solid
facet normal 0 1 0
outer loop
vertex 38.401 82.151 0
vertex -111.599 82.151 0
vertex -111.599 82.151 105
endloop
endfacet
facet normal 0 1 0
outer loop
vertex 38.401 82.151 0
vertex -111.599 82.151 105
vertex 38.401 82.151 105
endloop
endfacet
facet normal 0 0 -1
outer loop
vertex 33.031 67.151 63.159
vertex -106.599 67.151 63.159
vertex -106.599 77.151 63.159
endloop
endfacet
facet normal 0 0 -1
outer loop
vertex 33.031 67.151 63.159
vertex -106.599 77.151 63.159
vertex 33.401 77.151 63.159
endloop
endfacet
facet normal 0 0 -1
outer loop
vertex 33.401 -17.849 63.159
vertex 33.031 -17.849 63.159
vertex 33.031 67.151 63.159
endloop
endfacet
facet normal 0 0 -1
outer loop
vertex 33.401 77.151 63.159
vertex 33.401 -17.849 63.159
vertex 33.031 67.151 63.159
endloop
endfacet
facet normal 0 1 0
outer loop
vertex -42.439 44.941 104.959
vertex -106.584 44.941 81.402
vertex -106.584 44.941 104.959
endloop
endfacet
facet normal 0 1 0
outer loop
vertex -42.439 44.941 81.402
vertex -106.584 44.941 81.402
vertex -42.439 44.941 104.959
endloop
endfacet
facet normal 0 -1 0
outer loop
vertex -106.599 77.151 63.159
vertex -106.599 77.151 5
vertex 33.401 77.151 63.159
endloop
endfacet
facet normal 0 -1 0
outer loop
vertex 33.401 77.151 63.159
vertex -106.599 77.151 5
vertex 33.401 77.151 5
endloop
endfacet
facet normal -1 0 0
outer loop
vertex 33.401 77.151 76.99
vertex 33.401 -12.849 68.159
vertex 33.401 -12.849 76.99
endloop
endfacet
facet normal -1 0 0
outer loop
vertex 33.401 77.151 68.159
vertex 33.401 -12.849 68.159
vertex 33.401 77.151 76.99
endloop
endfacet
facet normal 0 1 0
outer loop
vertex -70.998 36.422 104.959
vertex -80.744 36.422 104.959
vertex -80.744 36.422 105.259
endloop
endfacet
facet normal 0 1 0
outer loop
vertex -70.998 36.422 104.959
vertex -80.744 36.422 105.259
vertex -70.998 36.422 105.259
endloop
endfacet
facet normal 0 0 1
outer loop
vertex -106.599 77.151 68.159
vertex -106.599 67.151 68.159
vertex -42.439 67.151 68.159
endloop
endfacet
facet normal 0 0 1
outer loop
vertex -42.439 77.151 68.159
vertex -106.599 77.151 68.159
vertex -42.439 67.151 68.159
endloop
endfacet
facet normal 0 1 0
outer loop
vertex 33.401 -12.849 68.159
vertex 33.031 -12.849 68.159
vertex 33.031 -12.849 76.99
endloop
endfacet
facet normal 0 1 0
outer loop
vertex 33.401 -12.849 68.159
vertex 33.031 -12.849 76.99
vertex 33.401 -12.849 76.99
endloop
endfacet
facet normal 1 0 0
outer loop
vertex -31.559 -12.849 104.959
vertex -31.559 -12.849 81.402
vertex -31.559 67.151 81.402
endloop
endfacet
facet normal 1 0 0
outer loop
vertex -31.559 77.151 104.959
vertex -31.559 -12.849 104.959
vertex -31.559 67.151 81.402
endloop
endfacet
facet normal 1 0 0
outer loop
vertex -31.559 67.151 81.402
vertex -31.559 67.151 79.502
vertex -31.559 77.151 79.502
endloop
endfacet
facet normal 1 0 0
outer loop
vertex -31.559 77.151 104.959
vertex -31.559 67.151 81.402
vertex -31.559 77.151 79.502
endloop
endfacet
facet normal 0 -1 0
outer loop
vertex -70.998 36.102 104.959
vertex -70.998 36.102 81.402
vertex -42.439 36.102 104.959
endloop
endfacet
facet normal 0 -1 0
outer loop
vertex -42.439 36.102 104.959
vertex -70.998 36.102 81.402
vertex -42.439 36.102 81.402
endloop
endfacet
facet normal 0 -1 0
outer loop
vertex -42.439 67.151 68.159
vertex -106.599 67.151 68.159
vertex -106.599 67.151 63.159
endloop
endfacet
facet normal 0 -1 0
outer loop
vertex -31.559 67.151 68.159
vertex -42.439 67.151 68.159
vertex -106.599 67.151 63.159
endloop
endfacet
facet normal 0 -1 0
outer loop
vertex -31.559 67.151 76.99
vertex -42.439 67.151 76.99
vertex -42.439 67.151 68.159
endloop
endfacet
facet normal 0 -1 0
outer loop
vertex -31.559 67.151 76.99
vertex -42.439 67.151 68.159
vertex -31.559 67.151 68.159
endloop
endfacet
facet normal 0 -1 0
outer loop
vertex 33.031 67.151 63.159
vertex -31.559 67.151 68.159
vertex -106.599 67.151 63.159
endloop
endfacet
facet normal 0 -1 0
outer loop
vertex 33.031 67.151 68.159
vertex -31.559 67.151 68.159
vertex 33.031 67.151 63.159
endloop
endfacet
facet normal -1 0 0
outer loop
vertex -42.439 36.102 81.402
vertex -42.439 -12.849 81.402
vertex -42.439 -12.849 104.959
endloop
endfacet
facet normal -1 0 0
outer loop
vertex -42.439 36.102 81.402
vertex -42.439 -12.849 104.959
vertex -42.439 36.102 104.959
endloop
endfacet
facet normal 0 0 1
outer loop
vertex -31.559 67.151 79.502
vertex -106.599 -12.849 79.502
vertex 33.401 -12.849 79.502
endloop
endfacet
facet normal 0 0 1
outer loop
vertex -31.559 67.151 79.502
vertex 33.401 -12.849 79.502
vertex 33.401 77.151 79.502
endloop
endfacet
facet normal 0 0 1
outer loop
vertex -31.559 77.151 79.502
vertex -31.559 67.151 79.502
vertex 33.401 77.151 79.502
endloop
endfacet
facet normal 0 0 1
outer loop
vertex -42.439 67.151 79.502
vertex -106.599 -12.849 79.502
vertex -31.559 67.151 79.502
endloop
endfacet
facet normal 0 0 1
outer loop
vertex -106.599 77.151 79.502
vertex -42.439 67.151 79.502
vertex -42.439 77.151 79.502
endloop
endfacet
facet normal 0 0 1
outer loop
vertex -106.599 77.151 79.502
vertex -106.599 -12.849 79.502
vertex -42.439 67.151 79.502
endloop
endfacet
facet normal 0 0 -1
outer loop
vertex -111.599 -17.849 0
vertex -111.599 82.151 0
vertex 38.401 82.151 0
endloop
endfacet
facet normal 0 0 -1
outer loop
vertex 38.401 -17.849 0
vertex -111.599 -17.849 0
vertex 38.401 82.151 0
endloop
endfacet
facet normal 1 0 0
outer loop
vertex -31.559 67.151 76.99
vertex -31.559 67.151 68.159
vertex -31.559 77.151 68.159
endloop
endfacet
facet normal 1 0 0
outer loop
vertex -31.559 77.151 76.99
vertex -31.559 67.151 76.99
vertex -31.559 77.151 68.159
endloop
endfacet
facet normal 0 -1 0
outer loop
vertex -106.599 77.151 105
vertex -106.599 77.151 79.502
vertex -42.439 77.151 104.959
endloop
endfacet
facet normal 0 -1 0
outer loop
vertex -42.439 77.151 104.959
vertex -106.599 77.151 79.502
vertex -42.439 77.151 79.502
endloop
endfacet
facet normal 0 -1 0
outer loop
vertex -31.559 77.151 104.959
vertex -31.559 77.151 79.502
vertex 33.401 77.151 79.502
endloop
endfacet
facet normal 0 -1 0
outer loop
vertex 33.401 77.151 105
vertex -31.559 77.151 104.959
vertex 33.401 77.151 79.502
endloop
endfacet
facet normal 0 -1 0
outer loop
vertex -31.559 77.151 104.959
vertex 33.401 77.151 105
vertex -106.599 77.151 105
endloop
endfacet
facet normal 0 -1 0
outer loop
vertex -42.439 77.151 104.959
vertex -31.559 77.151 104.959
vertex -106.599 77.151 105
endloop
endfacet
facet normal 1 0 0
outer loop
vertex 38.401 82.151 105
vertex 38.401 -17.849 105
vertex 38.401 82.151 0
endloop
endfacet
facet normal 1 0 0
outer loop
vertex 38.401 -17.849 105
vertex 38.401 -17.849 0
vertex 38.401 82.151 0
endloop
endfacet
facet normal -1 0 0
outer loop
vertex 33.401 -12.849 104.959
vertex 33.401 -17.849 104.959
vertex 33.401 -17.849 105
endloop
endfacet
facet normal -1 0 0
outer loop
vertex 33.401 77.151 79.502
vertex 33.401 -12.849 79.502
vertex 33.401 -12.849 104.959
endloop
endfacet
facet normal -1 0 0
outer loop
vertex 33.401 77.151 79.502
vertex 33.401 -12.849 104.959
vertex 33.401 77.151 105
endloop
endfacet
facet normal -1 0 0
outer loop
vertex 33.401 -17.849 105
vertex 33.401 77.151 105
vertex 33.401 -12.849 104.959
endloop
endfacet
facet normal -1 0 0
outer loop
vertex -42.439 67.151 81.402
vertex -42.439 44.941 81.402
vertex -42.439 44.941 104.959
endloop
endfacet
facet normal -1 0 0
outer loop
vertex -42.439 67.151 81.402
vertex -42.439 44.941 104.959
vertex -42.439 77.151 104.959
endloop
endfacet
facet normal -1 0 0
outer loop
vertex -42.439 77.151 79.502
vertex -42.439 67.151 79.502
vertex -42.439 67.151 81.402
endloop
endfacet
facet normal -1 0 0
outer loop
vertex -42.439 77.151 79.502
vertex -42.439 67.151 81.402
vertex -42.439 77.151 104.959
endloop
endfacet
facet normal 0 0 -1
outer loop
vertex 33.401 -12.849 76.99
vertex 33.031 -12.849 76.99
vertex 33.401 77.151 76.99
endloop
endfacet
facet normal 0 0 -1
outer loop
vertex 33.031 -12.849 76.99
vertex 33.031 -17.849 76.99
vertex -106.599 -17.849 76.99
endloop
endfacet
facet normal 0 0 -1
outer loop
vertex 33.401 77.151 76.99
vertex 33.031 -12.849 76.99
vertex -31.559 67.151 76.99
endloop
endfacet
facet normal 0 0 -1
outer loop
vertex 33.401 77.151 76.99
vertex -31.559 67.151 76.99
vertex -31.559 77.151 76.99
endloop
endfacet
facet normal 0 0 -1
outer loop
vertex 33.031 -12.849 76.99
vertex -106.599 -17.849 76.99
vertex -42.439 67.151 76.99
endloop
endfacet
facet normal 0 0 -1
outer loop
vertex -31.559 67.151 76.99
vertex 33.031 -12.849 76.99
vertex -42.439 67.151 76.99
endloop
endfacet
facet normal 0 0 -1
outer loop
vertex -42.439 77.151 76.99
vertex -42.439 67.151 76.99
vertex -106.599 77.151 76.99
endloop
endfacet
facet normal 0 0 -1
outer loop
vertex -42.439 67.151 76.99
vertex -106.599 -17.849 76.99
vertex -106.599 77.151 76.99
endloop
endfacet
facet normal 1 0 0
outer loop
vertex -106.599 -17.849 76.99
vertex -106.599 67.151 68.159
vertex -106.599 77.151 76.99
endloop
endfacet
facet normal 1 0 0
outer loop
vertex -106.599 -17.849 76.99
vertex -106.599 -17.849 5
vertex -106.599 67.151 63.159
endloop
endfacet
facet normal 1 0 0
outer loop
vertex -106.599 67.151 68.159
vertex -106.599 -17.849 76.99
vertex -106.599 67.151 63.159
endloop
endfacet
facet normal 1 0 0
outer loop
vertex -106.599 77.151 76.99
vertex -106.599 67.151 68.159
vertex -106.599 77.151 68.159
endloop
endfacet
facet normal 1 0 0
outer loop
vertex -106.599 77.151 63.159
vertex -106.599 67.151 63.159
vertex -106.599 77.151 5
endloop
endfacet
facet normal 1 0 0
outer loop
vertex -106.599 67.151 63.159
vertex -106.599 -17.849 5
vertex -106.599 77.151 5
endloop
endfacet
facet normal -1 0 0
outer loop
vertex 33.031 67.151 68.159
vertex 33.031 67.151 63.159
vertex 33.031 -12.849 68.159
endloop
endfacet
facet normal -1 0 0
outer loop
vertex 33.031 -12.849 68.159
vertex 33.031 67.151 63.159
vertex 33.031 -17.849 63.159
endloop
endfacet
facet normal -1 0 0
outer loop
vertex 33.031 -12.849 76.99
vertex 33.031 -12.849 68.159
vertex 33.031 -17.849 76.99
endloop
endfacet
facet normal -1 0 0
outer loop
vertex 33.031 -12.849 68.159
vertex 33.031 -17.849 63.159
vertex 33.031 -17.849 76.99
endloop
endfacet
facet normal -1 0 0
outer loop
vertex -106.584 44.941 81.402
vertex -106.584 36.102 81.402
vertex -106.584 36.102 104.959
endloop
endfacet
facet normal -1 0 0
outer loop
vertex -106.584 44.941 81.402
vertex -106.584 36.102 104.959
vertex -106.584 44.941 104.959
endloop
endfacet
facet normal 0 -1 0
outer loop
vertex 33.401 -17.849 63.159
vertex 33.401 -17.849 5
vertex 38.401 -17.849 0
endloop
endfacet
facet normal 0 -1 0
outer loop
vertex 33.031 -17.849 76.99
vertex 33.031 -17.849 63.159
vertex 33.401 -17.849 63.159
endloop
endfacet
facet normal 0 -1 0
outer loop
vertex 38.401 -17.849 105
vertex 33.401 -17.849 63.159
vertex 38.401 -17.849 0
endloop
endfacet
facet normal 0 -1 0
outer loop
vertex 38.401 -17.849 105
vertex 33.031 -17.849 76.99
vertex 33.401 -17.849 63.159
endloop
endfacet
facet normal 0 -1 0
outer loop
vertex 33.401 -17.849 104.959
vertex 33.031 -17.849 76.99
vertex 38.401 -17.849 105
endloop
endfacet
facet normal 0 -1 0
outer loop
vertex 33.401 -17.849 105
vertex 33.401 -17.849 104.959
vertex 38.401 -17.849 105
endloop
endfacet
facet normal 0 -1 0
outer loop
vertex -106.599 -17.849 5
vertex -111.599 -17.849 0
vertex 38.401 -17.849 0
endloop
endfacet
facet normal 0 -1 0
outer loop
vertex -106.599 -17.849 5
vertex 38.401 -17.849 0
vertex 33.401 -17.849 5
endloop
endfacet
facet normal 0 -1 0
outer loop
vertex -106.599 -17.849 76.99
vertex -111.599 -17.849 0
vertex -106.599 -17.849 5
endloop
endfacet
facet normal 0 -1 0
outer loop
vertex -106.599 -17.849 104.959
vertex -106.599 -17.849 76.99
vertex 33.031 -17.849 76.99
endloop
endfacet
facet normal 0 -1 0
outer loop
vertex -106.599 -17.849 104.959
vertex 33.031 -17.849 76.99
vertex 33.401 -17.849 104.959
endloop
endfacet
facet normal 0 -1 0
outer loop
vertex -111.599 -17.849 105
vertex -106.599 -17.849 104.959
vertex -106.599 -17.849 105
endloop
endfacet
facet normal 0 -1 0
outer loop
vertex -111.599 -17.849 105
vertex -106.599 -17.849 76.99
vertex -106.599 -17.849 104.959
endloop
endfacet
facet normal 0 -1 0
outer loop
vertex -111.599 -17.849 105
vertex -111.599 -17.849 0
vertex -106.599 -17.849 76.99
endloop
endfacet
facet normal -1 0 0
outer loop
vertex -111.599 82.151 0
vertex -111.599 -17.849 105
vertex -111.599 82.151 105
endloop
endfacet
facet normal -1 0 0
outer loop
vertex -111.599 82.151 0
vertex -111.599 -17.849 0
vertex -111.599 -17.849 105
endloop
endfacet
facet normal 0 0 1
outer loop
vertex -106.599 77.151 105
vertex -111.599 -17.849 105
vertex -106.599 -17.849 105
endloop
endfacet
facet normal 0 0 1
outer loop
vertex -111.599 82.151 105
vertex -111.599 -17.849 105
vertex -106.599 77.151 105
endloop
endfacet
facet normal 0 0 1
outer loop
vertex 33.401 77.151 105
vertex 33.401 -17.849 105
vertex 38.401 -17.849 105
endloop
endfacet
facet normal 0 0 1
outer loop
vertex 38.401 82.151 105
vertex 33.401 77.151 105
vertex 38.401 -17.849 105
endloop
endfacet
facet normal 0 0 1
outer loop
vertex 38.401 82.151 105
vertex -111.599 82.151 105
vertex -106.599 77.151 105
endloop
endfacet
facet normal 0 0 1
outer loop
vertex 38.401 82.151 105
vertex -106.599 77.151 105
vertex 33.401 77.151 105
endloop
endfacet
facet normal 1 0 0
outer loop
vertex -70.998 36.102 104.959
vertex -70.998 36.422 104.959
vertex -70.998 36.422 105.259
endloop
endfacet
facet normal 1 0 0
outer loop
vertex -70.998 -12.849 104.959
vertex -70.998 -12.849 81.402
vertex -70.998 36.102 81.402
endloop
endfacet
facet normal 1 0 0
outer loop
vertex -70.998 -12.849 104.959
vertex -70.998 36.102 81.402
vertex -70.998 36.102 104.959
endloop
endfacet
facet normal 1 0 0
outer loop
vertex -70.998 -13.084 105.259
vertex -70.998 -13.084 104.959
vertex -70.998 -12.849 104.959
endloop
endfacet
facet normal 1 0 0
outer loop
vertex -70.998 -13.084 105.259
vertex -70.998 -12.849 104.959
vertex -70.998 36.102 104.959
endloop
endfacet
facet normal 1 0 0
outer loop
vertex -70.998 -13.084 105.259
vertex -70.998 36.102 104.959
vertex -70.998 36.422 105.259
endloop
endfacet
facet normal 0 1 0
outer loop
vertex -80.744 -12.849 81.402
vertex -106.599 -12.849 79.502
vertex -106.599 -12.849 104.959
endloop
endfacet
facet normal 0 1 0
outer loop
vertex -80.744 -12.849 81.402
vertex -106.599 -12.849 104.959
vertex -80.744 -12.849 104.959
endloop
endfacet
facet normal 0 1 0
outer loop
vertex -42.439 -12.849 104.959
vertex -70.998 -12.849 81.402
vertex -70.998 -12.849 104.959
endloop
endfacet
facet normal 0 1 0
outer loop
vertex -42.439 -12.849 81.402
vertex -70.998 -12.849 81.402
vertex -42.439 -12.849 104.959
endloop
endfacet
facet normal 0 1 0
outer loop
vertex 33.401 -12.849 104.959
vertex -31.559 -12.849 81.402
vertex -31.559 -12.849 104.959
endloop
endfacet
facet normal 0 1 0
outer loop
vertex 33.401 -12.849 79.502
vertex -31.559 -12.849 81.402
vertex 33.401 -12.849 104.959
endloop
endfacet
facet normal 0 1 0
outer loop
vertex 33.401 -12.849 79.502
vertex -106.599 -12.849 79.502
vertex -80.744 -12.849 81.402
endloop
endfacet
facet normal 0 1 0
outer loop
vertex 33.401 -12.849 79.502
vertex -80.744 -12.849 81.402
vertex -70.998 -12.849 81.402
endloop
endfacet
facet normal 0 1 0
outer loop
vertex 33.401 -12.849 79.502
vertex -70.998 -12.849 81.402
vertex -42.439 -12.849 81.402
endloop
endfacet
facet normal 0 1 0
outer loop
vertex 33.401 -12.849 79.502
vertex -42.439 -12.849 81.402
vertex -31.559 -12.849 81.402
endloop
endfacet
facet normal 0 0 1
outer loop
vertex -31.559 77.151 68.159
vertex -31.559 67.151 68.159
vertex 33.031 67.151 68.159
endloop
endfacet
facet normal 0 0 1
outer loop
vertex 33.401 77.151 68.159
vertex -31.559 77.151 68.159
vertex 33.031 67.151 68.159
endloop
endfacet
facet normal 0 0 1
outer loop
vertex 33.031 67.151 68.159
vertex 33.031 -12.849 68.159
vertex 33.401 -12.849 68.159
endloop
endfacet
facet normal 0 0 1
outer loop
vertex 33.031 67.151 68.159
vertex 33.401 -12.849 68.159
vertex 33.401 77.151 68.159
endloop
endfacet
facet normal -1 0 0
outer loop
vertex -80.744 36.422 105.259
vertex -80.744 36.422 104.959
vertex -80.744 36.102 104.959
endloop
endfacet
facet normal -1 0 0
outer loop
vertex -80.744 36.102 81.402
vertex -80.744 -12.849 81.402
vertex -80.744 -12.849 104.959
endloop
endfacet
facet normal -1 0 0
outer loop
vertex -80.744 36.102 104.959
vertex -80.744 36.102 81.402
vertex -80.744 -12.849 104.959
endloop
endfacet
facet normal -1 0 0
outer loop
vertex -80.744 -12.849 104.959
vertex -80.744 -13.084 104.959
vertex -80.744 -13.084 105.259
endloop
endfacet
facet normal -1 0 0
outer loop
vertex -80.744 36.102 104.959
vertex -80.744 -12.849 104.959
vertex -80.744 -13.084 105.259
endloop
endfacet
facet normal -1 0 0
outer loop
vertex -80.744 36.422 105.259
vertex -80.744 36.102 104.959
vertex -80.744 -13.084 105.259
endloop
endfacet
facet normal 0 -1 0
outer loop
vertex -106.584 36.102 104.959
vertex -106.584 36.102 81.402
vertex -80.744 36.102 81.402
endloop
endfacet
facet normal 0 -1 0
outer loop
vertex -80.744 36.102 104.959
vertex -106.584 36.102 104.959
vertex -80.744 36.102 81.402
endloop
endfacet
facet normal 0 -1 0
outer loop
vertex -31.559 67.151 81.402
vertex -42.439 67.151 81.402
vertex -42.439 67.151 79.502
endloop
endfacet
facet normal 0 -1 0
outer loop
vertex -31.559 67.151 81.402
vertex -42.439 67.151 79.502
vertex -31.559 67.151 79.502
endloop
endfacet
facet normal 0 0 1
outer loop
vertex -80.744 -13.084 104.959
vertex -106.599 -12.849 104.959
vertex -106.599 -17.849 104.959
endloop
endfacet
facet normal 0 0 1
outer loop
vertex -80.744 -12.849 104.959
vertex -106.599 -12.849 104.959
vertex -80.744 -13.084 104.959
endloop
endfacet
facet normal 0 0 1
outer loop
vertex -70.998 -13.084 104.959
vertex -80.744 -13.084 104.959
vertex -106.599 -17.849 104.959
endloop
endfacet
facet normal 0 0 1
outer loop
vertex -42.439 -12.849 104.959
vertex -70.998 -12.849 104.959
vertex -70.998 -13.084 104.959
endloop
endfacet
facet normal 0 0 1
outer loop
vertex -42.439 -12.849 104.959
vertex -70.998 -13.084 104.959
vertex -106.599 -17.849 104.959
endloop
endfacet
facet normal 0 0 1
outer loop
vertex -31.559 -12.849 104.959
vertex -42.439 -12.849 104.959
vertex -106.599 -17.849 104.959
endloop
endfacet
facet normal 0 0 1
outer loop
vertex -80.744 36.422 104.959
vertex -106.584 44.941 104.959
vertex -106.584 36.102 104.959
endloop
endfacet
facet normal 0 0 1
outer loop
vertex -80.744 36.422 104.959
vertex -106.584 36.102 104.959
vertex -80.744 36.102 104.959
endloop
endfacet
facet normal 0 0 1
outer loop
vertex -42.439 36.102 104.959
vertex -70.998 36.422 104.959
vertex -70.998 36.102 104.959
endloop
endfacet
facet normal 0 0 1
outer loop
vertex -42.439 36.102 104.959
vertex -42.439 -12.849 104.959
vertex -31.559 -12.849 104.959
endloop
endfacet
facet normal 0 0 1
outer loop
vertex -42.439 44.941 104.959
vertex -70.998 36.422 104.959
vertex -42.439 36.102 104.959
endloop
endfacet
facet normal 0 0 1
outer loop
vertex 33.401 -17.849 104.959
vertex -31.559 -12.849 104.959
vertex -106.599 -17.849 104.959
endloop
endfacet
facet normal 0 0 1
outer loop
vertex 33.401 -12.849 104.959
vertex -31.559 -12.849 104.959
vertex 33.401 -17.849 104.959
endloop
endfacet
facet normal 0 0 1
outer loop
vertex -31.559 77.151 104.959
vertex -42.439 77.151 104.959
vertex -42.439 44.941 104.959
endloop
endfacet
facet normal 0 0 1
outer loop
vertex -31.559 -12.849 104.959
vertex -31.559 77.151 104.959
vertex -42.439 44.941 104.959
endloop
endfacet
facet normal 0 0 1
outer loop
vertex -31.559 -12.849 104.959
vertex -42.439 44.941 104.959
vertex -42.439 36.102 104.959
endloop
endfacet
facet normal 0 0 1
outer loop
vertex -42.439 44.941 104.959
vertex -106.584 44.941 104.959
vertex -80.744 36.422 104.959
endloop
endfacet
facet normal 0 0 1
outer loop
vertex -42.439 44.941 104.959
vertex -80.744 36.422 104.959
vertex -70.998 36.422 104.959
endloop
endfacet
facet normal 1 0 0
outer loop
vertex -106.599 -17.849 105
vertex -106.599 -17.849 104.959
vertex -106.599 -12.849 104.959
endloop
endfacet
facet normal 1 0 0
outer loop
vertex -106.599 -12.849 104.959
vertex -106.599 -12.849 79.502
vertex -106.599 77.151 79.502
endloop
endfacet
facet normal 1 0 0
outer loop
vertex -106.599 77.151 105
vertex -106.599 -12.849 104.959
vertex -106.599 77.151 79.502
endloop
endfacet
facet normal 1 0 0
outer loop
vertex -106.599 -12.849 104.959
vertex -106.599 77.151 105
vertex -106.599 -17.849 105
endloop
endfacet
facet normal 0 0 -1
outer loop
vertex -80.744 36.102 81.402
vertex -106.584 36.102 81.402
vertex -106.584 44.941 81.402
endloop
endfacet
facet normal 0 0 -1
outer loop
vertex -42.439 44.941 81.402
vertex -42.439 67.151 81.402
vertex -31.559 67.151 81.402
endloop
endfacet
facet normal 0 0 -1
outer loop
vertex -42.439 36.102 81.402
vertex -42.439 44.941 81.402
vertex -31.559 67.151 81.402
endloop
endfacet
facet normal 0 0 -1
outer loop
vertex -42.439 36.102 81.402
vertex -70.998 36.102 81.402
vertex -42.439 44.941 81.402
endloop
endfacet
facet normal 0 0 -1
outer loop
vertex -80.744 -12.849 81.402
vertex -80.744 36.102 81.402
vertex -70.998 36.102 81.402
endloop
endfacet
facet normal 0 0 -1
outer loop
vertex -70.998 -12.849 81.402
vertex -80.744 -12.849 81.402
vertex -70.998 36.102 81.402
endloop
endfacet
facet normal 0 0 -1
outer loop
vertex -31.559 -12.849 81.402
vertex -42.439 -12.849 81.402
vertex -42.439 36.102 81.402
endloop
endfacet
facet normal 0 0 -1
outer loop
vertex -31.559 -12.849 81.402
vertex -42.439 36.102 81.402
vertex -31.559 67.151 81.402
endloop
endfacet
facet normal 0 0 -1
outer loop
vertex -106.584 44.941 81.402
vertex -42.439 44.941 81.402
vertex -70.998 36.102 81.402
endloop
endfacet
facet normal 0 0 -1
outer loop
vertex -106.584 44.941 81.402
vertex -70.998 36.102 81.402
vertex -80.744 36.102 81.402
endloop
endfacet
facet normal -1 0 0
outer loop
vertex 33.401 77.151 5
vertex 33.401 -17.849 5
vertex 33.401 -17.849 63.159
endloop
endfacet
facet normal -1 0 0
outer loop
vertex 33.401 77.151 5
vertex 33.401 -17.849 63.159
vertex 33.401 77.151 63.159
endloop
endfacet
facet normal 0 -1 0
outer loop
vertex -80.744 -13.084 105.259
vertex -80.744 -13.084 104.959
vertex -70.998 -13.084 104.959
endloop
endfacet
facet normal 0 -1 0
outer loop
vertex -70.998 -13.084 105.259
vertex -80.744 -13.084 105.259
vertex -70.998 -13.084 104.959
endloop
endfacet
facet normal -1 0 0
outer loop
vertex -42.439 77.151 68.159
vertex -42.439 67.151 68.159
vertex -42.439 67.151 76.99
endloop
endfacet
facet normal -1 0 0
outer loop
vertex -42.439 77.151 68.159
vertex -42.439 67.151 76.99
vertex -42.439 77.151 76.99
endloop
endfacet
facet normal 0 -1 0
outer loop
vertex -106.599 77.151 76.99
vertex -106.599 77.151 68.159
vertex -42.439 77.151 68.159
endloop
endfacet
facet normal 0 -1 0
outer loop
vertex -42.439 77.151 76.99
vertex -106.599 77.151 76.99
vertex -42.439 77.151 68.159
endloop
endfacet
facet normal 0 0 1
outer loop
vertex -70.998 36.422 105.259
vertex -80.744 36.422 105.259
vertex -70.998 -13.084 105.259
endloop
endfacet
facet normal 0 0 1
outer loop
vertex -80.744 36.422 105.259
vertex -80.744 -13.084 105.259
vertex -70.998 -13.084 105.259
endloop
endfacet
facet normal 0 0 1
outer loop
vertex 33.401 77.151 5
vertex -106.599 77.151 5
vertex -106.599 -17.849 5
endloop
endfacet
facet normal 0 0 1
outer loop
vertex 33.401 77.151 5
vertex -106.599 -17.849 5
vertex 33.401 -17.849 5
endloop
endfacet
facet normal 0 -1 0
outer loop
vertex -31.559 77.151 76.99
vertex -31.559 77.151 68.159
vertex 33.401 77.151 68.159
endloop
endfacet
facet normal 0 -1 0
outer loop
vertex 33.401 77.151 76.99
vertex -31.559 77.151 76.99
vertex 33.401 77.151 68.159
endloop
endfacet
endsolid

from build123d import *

# Parameters (mm, degrees)
F0_W      = 150
F0_H      = 100
F1_DEPTH  = 5
F2_W      = 5
F2_H      = 100
F3_DEPTH  = 100
F4_W      = 145
F4_H      = 5
F5_DEPTH  = 100
F6_W      = 5
F6_H      = 95
F7_DEPTH  = 100
F8_W      = 140
F8_H      = 5
F9_DEPTH  = 100
F10_W     = 140
F10_H     = 5
F11_DEPTH = 36.8
F12_W     = 10.8797177672
F12_H     = 90
F13_DEPTH = 36.8
F15_W     = 64.1449913383
F15_H     = 8.8397674263
F16_DEPTH = 36.8
F17_W     = 9.7464099526
F17_H     = 48.5053984448
F18_DEPTH = 37.1
F19_DEPTH = 1
F20_W     = 139.6295134723
F20_H     = 18.2434022427
F21_DEPTH = 85
F22_W     = 95
F22_H     = 2.5124400854
F23_DEPTH = 142.2
F25_DEPTH = 3


with BuildPart() as f1:
    # F0 (on Top) → F1 (new body)
    with BuildSketch(Plane.XY):
        with Locations((-36.598560214, 32.1514412761)):
            Rectangle(F0_W, F0_H)
    extrude(amount=F1_DEPTH)

    # F2 (on face) → F3 (join)
    with BuildSketch(Plane.XY.offset(5)):
        with Locations((-109.098560214, 32.1514412761)):
            Rectangle(F2_W, F2_H)
    extrude(amount=F3_DEPTH)

    # F4 (on face) → F5 (join)
    with BuildSketch(Plane.XY.offset(5)):
        with Locations((-34.098560214, 79.6514412761)):
            Rectangle(F4_W, F4_H)
    extrude(amount=F5_DEPTH)

    # F6 (on face) → F7 (join)
    with BuildSketch(Plane.XY.offset(5)):
        with Locations((35.901439786, 29.6514412761)):
            Rectangle(F6_W, F6_H)
    extrude(amount=F7_DEPTH)

    # F8 (on face) → F9 (join)
    with BuildSketch(Plane.XZ.offset(17.8485587239)):
        with Locations((-36.598560214, 65.6586462259)):
            Rectangle(F8_W, F8_H)
    extrude(amount=-F9_DEPTH)

    # F10 (on face) → F11 (join)
    with BuildSketch(Plane.XY.offset(68.1586462259)):
        with Locations((-36.598560214, -15.3485587239)):
            Rectangle(F10_W, F10_H)
    extrude(amount=F11_DEPTH)

    # F12 (on face) → F13 (join)
    with BuildSketch(Plane.XY.offset(68.1586462259)):
        with Locations((-36.9987897575, 32.1514412761)):
            Rectangle(F12_W, F12_H)
    extrude(amount=F13_DEPTH)

    # F15 (on face) → F16 (join)
    with BuildSketch(Plane.XY.offset(68.1586462259)):
        with Locations((-74.5111443102, 40.5214224011)):
            Rectangle(F15_W, F15_H)
    extrude(amount=F16_DEPTH)

    # F17 (on face) → F18 (join)
    with BuildSketch(Plane.XY.offset(68.1586462259)):
        with Locations((-75.8711062372, 11.1688547768)):
            Rectangle(F17_W, F17_H)
    extrude(amount=F18_DEPTH)

    # F19 (add): a face of the model
    f19_faces = [f1.faces().sort_by_distance(p)[0] for p in [
        (-75.8711062372, 35.4215539992, 86.7086462259),
    ]]
    extrude(f19_faces, amount=F19_DEPTH)

    # F20 (on face) → F21 (cut)
    with BuildSketch(Plane.XZ.offset(17.8485587239)):
        with Locations((-36.7838034779, 72.2803473473)):
            Rectangle(F20_W, F20_H)
    extrude(amount=-F21_DEPTH, mode=Mode.SUBTRACT)

    # F22 (on face) → F23 (join)
    with BuildSketch(Plane.YZ.offset(-106.598560214)):
        with Locations((29.6514412761, 78.2460346818)):
            Rectangle(F22_W, F22_H)
    extrude(amount=F23_DEPTH)

    # F24 (on face) → F25 (join)
    with BuildSketch(Plane(origin=(0, 0, 81.4020484686), x_dir=(1, 0, 0), z_dir=(0, 0, -1))):
        Polygon((33.0309532583, 17.8485587239), (-106.598560214, 17.8485587239), (-106.598560214, 12.8485587239), (-80.7443112135, 12.8485587239), (-70.9979012609, 12.8485587239), (-42.4386486411, 12.8485587239), (-31.5589308739, 12.8485587239), (33.0309532583, 12.8485587239), align=None)
    extrude(amount=F25_DEPTH)


solid = f1.part
